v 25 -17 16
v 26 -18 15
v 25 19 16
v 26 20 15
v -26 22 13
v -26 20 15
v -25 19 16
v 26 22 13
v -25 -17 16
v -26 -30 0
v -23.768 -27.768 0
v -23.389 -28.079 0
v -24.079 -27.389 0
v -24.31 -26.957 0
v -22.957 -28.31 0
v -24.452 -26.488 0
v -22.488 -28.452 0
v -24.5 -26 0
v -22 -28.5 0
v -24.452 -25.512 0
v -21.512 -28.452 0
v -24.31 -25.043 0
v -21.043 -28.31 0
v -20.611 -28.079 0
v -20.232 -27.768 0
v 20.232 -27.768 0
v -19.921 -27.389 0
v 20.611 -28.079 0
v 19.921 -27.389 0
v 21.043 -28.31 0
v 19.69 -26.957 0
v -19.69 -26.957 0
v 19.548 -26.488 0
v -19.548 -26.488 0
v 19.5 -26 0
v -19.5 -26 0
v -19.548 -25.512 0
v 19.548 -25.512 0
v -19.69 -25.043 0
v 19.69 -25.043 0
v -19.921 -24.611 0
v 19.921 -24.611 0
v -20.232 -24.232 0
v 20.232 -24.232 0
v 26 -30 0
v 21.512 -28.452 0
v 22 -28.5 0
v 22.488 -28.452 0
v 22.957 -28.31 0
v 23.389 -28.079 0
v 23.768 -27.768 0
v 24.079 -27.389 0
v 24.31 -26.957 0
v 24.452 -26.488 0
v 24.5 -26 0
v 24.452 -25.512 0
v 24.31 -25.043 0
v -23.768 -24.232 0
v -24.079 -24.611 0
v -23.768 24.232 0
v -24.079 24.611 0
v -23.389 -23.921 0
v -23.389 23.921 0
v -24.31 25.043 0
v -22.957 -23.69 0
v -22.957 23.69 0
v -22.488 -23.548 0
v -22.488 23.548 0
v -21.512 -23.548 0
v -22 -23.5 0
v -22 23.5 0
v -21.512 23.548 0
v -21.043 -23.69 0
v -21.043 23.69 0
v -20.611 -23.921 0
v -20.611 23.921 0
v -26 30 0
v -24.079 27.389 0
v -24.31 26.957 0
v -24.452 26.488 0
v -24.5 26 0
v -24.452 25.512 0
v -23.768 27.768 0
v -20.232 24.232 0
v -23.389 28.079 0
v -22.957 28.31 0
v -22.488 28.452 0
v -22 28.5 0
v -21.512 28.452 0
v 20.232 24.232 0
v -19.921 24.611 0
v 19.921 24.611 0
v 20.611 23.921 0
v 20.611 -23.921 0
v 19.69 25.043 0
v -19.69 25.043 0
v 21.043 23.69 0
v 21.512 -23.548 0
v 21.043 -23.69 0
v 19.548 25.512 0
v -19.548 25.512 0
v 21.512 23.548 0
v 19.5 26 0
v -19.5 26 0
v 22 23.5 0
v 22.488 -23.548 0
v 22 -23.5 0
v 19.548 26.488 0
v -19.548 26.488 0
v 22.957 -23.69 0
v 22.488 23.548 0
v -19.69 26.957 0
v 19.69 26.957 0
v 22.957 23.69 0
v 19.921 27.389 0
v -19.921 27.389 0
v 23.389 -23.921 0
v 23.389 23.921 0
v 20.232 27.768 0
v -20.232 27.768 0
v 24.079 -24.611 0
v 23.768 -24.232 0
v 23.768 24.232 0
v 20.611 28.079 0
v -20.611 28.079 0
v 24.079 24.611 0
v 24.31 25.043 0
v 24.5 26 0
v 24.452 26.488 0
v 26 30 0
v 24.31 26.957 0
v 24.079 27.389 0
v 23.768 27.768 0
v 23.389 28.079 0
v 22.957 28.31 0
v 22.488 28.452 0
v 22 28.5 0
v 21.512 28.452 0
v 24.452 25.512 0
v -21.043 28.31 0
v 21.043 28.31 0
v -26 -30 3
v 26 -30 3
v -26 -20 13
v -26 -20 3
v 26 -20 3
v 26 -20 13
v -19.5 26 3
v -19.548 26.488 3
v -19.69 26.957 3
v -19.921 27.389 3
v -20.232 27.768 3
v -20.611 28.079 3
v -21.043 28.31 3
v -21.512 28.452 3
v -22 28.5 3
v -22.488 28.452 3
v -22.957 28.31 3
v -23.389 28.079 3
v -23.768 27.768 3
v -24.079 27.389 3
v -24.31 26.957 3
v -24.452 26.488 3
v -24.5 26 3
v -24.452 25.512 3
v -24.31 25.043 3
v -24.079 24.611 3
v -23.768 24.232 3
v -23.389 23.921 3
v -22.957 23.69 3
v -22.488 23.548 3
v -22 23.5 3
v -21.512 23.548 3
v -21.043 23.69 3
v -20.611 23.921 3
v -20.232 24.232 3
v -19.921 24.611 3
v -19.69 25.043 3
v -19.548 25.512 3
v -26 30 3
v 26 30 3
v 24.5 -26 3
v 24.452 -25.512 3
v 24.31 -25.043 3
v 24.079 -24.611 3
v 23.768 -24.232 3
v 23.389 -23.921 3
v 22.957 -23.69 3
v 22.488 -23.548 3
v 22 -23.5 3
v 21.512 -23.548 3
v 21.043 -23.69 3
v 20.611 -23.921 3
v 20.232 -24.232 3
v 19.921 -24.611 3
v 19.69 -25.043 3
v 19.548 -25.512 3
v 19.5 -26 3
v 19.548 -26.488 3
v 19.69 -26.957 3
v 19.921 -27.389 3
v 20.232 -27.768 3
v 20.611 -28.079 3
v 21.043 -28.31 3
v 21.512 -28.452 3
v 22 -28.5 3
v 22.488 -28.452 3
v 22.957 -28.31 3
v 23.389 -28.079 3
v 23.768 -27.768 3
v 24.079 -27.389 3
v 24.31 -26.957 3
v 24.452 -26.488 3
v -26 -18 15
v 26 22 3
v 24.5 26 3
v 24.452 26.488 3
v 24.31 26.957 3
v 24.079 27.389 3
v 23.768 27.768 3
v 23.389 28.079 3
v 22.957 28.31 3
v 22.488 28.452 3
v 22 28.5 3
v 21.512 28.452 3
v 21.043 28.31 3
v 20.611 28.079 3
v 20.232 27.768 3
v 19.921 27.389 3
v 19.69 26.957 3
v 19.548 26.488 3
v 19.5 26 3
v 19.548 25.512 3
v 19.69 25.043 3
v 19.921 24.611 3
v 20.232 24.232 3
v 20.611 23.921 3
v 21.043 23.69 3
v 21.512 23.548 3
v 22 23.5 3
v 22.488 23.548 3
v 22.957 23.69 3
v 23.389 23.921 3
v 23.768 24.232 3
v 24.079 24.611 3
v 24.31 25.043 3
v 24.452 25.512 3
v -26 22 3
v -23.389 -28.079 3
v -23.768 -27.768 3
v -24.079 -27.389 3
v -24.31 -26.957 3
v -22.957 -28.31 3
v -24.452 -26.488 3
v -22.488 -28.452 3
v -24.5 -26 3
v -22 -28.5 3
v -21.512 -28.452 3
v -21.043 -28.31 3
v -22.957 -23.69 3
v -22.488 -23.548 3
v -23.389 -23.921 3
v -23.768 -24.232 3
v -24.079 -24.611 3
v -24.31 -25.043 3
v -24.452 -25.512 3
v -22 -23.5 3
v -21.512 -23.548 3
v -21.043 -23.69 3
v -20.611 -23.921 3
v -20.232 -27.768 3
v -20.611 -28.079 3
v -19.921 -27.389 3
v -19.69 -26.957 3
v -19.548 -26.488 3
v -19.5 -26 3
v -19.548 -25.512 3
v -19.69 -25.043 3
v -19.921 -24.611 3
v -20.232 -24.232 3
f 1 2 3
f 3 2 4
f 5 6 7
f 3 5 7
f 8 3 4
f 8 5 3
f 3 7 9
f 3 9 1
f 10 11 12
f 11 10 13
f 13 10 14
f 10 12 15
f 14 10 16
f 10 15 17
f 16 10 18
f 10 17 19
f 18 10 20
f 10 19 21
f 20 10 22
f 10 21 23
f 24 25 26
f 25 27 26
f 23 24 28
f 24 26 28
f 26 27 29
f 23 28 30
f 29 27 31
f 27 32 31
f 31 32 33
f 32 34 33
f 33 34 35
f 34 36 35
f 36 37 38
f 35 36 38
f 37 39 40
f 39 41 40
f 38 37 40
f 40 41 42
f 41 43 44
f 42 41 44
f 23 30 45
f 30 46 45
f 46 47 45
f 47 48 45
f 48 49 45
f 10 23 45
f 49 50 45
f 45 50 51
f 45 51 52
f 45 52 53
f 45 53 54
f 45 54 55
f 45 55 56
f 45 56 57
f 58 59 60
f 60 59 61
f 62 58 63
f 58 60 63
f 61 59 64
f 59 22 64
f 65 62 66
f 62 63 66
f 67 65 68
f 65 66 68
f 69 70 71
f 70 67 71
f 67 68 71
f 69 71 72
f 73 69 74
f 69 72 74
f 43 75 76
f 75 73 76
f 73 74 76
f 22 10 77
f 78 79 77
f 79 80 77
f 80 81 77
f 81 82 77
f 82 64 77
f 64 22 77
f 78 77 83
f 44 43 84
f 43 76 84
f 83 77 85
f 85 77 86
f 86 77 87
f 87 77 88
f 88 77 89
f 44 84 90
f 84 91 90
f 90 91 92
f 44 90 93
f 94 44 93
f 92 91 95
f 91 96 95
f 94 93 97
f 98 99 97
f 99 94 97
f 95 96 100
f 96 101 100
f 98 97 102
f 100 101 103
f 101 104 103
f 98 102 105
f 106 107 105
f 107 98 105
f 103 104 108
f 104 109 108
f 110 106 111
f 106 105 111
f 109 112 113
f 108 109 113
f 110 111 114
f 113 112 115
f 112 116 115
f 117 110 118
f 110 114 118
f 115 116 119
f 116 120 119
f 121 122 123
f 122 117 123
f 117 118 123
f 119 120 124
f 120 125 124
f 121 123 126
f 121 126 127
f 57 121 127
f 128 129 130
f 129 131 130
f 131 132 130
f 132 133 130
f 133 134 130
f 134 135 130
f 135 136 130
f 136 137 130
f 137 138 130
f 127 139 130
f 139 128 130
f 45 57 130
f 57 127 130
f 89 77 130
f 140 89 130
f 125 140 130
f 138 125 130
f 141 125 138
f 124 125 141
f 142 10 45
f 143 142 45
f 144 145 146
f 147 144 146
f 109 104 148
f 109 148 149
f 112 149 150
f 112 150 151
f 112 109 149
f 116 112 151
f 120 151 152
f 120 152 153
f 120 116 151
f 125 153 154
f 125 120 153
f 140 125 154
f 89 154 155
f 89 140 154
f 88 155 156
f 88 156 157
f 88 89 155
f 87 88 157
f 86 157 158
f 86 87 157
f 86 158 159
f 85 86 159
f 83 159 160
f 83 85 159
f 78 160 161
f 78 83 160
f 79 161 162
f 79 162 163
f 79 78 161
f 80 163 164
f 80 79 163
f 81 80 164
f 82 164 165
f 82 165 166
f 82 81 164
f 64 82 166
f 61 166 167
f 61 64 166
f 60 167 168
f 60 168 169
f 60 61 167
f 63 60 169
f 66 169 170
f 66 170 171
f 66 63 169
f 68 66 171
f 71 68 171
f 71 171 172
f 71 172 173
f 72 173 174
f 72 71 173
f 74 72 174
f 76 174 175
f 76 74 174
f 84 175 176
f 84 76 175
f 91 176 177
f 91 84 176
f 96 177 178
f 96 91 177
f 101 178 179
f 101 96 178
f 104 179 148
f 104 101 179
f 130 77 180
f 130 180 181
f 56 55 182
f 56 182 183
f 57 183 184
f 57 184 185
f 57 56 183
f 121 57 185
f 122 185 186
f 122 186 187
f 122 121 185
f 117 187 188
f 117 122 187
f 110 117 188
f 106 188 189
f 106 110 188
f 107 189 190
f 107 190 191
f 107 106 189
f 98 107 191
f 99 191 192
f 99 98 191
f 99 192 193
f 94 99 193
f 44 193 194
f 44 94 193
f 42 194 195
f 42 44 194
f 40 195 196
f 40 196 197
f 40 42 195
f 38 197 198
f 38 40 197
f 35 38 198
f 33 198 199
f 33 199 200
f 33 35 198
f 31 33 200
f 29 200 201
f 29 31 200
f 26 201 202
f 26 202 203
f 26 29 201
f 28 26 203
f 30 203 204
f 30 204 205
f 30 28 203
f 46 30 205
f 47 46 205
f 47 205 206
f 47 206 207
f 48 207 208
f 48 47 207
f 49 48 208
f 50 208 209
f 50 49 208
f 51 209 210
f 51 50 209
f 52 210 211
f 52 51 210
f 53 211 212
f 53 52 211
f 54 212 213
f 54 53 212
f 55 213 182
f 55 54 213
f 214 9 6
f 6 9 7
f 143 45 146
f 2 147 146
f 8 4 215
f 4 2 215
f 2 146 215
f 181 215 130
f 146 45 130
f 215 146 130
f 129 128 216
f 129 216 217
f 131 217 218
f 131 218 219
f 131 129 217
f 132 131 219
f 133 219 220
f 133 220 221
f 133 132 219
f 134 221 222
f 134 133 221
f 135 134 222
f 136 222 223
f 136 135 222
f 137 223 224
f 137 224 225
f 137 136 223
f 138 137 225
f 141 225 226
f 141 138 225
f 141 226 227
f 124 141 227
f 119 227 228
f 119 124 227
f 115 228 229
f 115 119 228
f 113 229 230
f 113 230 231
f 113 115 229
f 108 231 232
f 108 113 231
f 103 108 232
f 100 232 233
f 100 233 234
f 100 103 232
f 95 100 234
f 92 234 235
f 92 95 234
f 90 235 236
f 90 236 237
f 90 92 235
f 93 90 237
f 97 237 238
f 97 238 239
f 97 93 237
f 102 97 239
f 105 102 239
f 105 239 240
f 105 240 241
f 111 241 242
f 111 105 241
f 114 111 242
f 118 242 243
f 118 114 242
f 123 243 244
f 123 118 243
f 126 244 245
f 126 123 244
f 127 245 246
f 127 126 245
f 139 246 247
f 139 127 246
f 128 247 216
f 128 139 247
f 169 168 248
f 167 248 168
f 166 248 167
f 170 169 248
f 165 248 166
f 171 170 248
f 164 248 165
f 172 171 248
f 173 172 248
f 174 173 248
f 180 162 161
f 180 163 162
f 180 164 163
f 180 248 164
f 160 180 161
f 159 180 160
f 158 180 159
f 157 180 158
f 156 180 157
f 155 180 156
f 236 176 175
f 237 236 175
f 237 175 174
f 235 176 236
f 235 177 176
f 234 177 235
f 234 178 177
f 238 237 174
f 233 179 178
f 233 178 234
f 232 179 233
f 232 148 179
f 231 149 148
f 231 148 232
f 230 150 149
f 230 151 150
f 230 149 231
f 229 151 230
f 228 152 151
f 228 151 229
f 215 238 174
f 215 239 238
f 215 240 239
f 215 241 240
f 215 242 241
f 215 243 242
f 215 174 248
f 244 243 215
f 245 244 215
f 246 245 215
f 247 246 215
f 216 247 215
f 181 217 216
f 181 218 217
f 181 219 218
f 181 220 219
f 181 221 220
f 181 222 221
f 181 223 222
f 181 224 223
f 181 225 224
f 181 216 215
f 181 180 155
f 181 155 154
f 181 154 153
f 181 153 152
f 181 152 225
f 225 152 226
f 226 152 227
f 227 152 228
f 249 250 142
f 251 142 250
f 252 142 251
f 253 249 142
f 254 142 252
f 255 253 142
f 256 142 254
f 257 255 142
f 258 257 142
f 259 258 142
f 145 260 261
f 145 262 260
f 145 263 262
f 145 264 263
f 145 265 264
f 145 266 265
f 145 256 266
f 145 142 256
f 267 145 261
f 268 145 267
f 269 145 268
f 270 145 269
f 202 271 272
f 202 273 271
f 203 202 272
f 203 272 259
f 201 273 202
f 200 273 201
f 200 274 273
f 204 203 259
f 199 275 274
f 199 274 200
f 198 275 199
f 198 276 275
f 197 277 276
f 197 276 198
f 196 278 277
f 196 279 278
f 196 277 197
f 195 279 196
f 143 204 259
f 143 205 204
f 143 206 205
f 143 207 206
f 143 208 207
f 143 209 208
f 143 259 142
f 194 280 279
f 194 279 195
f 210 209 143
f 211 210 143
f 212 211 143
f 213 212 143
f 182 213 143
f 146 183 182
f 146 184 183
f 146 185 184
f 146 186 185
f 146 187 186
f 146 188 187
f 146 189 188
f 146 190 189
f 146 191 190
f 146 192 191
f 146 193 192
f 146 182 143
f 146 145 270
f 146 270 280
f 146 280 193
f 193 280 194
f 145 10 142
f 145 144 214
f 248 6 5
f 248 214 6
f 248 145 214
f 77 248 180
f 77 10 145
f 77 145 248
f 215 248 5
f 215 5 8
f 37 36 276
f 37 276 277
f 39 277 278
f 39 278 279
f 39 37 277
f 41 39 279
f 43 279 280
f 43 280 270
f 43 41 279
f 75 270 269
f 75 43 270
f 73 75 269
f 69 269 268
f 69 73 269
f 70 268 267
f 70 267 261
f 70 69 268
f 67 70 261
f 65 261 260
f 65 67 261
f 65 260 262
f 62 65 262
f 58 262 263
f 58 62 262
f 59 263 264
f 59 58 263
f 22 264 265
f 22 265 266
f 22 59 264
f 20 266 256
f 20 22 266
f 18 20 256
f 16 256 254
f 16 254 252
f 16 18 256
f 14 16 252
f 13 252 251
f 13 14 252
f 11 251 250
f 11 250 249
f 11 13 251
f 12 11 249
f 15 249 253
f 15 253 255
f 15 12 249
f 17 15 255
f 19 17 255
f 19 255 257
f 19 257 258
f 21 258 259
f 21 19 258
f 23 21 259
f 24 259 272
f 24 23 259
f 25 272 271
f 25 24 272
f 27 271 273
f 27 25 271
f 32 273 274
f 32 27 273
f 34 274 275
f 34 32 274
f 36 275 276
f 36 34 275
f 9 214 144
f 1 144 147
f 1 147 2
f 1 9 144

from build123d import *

# Parameters (mm, degrees)
F0_W     = 52
F0_H     = 60
F0_R     = 2.5
F1_DEPTH = 3
F2_W     = 52
F2_H     = 42
F3_DEPTH = 13
F4_SIZE  = 3
F5_SIZE  = 3
F6_SIZE  = 1
F7_SIZE  = 1


with BuildPart() as f1:
    # F0 (on Top) → F1 (new body)
    with BuildSketch(Plane.XY):
        Rectangle(F0_W, F0_H)
        with Locations((-22, -26)):
            Circle(F0_R, mode=Mode.SUBTRACT)
        with Locations((22, -26)):
            Circle(F0_R, mode=Mode.SUBTRACT)
        with Locations((-22, 26)):
            Circle(F0_R, mode=Mode.SUBTRACT)
        with Locations((22, 26)):
            Circle(F0_R, mode=Mode.SUBTRACT)
    extrude(amount=F1_DEPTH)

    # F2 (on face) → F3 (join)
    with BuildSketch(Plane.XY.offset(3)):
        with Locations((0, 1)):
            Rectangle(F2_W, F2_H)
    extrude(amount=F3_DEPTH)

    # F4
    f4_edges = [f1.edges().sort_by_distance(p)[0] for p in [
        (0, -20, 16),
    ]]
    chamfer(f4_edges, length=F4_SIZE)

    # F5
    f5_edges = [f1.edges().sort_by_distance(p)[0] for p in [
        (0, 22, 16),
    ]]
    chamfer(f5_edges, length=F5_SIZE)

    # F6
    f6_edges = [f1.edges().sort_by_distance(p)[0] for p in [
        (-26, 1, 16),
    ]]
    chamfer(f6_edges, length=F6_SIZE)

    # F7
    f7_edges = [f1.edges().sort_by_distance(p)[0] for p in [
        (26, 1, 16),
    ]]
    chamfer(f7_edges, length=F7_SIZE)


solid = f1.part
